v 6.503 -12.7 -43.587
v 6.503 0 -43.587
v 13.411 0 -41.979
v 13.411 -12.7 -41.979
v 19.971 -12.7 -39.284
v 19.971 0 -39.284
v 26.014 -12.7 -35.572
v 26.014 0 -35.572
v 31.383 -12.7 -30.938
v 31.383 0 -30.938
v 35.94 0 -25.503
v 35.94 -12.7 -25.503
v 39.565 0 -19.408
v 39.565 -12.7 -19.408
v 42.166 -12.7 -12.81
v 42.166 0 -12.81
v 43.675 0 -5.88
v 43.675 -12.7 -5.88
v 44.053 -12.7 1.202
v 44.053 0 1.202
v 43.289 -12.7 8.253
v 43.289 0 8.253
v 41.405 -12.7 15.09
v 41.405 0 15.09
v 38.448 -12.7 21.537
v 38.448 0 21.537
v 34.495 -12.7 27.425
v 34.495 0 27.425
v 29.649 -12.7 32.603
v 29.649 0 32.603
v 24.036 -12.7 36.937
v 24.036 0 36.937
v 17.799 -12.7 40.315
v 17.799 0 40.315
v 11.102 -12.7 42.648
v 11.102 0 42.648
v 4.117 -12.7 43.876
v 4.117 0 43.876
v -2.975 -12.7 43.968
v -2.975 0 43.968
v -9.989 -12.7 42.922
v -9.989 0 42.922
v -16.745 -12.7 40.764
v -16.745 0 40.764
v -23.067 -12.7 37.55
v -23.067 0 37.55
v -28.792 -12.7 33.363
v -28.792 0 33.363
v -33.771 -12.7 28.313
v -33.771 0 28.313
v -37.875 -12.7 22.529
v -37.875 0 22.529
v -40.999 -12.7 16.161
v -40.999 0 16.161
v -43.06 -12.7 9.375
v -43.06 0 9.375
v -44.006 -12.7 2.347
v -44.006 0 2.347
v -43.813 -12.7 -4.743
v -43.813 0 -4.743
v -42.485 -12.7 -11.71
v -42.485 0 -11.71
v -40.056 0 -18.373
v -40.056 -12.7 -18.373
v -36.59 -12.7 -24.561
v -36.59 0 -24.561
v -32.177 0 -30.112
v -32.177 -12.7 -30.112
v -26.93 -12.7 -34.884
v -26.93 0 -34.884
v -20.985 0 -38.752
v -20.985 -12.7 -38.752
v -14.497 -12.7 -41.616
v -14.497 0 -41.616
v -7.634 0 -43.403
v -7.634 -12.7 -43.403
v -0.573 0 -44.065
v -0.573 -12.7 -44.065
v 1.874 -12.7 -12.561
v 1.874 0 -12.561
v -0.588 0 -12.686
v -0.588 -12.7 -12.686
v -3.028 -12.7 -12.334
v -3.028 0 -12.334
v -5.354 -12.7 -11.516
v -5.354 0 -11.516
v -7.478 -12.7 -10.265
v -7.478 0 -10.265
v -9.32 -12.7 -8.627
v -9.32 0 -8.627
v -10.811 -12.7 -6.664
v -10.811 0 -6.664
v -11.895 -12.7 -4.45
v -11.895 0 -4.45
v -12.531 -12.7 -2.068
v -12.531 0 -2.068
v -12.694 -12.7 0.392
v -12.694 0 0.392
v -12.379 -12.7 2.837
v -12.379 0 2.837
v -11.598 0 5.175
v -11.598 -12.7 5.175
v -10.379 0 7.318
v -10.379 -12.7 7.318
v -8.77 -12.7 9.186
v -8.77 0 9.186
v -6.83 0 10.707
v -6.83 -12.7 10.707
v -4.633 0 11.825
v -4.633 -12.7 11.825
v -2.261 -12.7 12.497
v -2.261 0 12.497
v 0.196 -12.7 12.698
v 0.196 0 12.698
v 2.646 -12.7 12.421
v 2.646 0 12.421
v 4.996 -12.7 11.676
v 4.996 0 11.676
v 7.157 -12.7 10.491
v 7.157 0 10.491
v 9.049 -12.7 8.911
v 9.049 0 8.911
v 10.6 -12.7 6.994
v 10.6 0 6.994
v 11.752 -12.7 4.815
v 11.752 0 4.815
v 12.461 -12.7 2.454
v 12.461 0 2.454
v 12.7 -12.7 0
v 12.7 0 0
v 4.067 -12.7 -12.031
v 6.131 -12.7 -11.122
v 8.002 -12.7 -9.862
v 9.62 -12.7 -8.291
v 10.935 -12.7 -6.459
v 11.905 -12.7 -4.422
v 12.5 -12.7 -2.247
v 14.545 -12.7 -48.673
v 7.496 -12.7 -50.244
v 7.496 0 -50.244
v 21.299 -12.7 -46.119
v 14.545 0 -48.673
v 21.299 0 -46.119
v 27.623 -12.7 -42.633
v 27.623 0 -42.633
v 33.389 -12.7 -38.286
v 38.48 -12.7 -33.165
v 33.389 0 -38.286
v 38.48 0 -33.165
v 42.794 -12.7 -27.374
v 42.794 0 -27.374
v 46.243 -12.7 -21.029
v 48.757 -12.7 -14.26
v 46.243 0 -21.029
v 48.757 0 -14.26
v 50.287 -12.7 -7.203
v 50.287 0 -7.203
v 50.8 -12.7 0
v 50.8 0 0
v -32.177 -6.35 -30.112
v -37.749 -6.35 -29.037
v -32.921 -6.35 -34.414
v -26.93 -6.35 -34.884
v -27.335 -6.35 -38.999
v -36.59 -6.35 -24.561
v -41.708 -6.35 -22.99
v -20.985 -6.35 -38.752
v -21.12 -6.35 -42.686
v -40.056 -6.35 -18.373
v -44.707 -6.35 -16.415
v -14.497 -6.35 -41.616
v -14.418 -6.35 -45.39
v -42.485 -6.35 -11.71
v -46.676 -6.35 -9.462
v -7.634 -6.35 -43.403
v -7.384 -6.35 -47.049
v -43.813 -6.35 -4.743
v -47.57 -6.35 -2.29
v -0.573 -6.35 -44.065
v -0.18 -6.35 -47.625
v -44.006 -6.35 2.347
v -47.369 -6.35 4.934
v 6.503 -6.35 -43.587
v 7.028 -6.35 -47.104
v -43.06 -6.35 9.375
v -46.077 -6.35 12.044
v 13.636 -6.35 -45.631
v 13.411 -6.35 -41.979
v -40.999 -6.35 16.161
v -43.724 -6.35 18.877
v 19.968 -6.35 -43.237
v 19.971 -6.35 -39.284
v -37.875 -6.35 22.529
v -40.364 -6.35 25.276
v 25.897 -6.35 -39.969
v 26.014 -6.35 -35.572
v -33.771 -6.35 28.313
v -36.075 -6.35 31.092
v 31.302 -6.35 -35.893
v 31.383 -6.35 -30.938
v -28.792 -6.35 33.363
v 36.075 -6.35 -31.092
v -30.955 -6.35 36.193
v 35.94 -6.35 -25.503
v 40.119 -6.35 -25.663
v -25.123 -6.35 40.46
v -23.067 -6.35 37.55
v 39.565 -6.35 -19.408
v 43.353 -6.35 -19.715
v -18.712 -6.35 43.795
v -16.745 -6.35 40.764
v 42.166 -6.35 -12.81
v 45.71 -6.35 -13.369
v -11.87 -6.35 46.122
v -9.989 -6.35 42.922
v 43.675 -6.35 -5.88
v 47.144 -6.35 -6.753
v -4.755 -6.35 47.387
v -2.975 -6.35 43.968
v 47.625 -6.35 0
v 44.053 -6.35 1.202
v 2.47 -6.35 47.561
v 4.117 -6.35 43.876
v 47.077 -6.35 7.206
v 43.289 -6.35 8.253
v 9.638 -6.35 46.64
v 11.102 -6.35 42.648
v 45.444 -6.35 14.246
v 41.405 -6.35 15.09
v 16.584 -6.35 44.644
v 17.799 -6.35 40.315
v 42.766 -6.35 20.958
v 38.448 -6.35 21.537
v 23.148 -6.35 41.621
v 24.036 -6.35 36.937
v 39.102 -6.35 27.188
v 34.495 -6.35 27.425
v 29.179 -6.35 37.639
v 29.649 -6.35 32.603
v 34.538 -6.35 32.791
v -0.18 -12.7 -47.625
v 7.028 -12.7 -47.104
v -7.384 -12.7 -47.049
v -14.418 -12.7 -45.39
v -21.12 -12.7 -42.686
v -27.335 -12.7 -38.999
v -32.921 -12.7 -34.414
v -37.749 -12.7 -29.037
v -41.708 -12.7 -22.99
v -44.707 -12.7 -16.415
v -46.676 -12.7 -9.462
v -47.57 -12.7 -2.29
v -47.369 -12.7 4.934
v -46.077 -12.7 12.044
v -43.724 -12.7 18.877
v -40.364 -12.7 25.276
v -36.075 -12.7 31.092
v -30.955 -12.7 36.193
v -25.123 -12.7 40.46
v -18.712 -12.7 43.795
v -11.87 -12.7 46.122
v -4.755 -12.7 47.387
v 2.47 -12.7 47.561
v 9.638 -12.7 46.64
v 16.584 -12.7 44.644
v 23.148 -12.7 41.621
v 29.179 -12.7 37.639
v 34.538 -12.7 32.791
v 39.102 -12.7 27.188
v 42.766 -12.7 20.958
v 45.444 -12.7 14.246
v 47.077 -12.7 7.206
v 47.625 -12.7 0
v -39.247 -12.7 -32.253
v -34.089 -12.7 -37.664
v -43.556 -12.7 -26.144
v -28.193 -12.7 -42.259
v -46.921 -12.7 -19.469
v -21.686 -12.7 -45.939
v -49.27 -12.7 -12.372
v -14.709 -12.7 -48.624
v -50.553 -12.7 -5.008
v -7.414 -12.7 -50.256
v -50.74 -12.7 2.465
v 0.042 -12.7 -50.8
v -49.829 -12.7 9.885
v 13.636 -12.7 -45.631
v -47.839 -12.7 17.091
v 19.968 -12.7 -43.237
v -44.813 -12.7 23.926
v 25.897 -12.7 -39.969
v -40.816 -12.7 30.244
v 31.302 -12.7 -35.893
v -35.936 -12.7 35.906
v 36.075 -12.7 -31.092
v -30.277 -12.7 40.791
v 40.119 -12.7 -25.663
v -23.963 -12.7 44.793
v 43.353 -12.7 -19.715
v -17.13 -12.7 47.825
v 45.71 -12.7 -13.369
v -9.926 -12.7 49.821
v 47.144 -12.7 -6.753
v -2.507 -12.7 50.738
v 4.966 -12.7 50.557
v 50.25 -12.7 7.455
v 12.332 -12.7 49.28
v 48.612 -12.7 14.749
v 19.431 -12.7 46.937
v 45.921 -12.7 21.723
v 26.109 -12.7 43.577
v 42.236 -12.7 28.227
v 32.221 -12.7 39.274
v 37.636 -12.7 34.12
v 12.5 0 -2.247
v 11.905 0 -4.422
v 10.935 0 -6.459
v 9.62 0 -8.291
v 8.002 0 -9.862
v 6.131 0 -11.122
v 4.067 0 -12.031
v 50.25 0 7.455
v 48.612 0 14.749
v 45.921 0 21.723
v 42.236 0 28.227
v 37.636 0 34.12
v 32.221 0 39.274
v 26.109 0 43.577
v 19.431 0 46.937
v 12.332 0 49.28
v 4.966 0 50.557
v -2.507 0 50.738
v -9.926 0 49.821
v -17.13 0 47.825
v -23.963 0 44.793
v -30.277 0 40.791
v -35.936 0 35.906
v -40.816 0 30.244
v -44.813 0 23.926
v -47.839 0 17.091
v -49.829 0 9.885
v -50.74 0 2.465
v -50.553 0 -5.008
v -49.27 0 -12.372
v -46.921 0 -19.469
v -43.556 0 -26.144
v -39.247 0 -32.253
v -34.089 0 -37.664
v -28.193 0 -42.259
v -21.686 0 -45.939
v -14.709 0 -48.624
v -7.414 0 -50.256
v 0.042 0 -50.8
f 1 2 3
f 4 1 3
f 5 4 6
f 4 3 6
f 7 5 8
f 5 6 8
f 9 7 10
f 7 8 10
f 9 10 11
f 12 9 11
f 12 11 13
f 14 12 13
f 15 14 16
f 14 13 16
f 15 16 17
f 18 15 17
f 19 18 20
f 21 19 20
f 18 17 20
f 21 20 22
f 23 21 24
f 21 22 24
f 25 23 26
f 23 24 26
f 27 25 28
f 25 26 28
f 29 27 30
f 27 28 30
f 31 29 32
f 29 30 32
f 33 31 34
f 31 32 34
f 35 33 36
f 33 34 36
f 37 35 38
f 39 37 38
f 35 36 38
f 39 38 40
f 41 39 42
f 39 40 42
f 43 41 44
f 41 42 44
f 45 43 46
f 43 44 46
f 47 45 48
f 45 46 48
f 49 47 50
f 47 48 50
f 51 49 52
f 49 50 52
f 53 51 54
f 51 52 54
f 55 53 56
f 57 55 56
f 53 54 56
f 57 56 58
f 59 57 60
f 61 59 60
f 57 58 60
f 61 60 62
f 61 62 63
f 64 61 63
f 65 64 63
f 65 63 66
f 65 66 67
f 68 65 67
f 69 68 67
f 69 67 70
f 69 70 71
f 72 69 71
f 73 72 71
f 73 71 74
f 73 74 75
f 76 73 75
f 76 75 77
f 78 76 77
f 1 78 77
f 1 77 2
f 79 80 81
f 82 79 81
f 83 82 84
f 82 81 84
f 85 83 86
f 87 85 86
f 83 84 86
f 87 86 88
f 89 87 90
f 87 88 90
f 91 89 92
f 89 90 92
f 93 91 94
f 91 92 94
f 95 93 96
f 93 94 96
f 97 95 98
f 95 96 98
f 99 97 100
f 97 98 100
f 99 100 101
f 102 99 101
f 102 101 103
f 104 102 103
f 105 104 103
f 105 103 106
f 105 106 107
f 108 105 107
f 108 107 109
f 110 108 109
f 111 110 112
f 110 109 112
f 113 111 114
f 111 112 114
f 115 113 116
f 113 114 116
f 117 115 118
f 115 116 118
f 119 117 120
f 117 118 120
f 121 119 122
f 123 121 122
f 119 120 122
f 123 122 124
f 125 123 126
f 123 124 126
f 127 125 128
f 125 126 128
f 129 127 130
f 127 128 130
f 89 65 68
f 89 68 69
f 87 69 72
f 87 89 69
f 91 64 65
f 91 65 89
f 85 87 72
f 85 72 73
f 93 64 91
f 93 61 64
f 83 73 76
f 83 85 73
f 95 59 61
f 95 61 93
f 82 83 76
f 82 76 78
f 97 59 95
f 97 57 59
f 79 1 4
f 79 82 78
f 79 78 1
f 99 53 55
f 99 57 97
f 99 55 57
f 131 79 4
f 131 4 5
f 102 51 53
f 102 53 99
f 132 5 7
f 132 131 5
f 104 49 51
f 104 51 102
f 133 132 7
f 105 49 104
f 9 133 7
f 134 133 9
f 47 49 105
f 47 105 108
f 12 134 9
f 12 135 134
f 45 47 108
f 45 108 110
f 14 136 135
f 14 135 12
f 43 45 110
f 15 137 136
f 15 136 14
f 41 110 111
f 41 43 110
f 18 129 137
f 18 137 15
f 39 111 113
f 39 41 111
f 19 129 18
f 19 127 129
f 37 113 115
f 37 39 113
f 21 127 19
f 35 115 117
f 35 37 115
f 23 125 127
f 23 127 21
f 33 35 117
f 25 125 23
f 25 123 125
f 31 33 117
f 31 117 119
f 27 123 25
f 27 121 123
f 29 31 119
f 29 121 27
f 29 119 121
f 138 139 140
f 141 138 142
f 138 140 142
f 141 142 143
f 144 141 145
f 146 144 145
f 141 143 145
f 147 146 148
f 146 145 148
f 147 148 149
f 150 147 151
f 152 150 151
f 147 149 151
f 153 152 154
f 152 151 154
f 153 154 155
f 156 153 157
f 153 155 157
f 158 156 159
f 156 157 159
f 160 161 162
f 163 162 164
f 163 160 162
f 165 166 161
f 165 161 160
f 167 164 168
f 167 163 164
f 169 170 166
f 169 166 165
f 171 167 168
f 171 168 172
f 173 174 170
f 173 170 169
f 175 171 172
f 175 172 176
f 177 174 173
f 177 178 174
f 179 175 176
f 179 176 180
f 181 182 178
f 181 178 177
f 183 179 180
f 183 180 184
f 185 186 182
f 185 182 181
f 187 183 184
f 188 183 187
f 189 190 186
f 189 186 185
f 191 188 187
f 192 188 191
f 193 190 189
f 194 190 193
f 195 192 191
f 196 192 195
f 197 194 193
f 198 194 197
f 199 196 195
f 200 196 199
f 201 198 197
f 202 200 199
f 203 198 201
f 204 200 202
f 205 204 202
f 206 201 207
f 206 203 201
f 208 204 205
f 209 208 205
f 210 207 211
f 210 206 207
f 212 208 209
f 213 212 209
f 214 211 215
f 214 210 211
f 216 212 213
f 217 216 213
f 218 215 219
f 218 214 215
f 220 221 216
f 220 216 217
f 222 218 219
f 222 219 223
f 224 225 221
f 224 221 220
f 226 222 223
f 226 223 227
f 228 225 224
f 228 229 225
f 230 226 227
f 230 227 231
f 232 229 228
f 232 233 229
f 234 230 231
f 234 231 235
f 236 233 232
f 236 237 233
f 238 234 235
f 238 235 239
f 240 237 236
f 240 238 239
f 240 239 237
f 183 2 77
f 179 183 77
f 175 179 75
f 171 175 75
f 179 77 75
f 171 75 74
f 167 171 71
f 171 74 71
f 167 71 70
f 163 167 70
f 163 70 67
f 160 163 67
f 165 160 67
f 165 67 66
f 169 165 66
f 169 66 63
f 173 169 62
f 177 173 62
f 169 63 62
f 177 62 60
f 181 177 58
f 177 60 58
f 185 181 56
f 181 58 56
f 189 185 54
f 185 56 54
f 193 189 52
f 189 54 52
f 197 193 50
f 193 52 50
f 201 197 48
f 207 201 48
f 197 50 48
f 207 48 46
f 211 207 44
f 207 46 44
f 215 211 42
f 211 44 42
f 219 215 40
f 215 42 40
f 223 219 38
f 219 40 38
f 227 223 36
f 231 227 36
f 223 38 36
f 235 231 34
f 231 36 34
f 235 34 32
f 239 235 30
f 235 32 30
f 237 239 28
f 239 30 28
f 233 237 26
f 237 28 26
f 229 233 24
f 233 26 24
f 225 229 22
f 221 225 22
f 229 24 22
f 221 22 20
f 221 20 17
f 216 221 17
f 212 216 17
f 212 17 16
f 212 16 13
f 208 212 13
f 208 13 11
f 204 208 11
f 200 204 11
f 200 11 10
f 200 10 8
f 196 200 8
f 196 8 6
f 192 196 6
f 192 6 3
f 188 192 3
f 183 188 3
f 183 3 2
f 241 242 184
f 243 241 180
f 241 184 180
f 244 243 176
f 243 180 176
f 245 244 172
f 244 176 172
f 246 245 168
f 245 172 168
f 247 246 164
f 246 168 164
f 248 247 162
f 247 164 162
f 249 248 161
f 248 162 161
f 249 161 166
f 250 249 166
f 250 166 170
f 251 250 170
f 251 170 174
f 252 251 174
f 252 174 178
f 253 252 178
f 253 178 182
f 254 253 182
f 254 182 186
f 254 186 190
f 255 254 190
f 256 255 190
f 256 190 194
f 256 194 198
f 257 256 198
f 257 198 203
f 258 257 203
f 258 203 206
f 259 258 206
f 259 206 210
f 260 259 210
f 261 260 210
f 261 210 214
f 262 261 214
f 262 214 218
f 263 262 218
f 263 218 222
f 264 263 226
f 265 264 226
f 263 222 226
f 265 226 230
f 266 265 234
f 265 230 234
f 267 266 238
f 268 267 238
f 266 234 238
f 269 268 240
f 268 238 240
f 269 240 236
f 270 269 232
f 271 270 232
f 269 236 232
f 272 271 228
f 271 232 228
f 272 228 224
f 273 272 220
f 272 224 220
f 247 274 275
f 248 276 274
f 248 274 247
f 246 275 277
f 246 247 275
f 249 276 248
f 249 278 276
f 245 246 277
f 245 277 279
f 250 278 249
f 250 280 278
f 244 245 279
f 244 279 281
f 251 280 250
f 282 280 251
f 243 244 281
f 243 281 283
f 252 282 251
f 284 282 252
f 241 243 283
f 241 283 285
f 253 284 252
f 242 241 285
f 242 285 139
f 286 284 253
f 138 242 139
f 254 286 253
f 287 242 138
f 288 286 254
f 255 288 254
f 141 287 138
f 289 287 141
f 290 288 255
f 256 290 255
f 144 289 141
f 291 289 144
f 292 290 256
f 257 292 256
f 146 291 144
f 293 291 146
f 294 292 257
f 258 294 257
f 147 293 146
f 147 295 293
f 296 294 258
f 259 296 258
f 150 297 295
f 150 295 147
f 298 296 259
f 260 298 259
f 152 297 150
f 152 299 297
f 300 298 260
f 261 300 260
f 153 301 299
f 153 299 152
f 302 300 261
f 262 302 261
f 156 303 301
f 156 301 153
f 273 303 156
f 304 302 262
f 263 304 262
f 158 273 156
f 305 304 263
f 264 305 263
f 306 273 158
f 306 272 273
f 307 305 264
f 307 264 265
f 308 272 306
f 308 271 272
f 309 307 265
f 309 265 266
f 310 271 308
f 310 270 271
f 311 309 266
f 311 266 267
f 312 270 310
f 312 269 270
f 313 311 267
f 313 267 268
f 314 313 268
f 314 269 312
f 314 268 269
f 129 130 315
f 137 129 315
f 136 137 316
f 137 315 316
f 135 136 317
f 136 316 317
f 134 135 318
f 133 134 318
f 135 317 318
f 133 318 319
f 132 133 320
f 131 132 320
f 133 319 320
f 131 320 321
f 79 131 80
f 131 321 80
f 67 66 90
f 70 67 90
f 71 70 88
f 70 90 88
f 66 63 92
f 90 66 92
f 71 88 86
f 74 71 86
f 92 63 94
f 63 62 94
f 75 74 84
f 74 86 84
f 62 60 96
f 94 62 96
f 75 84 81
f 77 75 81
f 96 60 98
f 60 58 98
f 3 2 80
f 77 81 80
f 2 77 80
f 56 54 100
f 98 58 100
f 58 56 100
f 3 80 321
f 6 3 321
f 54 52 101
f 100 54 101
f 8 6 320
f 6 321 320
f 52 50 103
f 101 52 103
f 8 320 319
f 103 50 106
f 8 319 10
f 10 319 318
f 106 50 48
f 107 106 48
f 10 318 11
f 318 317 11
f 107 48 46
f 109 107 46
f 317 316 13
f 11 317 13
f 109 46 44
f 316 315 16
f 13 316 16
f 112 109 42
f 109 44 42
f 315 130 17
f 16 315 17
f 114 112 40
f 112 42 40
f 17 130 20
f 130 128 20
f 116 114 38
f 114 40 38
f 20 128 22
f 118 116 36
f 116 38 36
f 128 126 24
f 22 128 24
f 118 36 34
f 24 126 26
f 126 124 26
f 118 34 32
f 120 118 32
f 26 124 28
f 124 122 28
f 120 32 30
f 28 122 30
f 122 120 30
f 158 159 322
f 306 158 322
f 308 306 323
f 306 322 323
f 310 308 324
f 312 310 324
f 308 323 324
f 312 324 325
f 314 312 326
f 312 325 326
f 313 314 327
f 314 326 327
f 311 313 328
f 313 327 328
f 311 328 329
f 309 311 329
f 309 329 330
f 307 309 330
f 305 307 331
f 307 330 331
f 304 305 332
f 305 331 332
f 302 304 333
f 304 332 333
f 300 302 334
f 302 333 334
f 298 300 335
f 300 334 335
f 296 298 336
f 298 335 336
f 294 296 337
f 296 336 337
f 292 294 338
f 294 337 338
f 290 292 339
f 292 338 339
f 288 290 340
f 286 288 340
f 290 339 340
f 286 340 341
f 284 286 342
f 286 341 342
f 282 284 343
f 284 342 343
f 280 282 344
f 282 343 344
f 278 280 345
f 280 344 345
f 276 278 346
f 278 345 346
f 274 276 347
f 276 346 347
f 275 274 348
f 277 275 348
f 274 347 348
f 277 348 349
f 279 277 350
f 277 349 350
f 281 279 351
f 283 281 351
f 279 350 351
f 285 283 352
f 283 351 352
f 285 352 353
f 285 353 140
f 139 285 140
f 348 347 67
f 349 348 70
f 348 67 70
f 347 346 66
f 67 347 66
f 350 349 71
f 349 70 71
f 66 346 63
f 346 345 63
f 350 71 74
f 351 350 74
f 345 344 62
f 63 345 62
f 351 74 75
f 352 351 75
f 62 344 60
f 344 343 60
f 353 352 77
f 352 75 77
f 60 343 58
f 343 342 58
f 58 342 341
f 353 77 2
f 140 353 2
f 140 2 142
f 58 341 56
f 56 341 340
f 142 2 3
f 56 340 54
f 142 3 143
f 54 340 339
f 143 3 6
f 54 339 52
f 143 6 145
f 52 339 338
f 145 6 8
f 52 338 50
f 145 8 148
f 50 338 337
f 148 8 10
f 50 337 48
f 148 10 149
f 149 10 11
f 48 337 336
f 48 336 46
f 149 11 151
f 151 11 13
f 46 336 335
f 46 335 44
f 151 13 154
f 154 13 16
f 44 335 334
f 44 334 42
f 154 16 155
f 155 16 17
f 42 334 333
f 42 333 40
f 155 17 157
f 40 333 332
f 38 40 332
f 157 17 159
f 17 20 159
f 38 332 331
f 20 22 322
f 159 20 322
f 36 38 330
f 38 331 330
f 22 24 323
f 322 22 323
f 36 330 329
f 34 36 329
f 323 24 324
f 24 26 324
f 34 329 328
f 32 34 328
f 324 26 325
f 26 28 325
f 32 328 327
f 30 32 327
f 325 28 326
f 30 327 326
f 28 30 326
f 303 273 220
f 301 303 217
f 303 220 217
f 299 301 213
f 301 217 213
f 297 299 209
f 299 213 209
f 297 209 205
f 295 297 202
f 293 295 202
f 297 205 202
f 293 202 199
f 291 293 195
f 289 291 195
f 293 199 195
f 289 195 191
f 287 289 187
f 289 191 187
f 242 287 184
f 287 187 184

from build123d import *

# Parameters (mm, degrees)
F1_DEPTH = 12.7
F2_DEPTH = 6.35


with BuildPart() as f1:
    # F0 (on Front) → F1 (new body)
    with BuildSketch(Plane.XZ):
        with BuildLine():
            ThreePointArc((7.4964542451, -50.2438371719), (38.480253869, -33.1648920121), (50.8, 0))
            ThreePointArc((50.8, 0), (-38.480253869, 33.1648920121), (7.4964542451, -50.2438371719))
        make_face()
        with BuildLine():
            ThreePointArc((47.625, 0), (36.0752380022, -31.0920862614), (7.0279258548, -47.1035973486))
            ThreePointArc((7.0279258548, -47.1035973486), (-36.0752380022, 31.0920862614), (47.625, 0))
        make_face(mode=Mode.SUBTRACT)
    extrude(amount=F1_DEPTH)

    # F0 (on Front) → F2 (join)
    with BuildSketch(Plane.XZ):
        with BuildLine():
            ThreePointArc((47.625, 0), (-36.0752380022, 31.0920862614), (7.0279258548, -47.1035973486))
            ThreePointArc((7.0279258548, -47.1035973486), (36.0752380022, -31.0920862614), (47.625, 0))
        make_face()
        with BuildLine():
            ThreePointArc((44.069, 0), (33.3816202314, -28.7705438205), (6.5031740576, -43.5865287466))
            ThreePointArc((6.5031740576, -43.5865287466), (-33.3816202314, 28.7705438205), (44.069, 0))
        make_face(mode=Mode.SUBTRACT)
    extrude(amount=F2_DEPTH)


with BuildPart() as f1b:
    # F0 (on Front) → F1, piece 2 (new body)
    with BuildSketch(Plane.XZ):
        with BuildLine():
            ThreePointArc((44.069, 0), (-33.3816202314, 28.7705438205), (6.5031740576, -43.5865287466))
            ThreePointArc((6.5031740576, -43.5865287466), (33.3816202314, -28.7705438205), (44.069, 0))
        make_face()
        with BuildLine():
            ThreePointArc((12.7, 0), (9.6200634673, -8.291223003), (1.8741135613, -12.560959293))
            ThreePointArc((1.8741135613, -12.560959293), (-9.6200634673, 8.291223003), (12.7, 0))
        make_face(mode=Mode.SUBTRACT)
    extrude(amount=F1_DEPTH)


solid = Compound([f1.part, f1b.part])
